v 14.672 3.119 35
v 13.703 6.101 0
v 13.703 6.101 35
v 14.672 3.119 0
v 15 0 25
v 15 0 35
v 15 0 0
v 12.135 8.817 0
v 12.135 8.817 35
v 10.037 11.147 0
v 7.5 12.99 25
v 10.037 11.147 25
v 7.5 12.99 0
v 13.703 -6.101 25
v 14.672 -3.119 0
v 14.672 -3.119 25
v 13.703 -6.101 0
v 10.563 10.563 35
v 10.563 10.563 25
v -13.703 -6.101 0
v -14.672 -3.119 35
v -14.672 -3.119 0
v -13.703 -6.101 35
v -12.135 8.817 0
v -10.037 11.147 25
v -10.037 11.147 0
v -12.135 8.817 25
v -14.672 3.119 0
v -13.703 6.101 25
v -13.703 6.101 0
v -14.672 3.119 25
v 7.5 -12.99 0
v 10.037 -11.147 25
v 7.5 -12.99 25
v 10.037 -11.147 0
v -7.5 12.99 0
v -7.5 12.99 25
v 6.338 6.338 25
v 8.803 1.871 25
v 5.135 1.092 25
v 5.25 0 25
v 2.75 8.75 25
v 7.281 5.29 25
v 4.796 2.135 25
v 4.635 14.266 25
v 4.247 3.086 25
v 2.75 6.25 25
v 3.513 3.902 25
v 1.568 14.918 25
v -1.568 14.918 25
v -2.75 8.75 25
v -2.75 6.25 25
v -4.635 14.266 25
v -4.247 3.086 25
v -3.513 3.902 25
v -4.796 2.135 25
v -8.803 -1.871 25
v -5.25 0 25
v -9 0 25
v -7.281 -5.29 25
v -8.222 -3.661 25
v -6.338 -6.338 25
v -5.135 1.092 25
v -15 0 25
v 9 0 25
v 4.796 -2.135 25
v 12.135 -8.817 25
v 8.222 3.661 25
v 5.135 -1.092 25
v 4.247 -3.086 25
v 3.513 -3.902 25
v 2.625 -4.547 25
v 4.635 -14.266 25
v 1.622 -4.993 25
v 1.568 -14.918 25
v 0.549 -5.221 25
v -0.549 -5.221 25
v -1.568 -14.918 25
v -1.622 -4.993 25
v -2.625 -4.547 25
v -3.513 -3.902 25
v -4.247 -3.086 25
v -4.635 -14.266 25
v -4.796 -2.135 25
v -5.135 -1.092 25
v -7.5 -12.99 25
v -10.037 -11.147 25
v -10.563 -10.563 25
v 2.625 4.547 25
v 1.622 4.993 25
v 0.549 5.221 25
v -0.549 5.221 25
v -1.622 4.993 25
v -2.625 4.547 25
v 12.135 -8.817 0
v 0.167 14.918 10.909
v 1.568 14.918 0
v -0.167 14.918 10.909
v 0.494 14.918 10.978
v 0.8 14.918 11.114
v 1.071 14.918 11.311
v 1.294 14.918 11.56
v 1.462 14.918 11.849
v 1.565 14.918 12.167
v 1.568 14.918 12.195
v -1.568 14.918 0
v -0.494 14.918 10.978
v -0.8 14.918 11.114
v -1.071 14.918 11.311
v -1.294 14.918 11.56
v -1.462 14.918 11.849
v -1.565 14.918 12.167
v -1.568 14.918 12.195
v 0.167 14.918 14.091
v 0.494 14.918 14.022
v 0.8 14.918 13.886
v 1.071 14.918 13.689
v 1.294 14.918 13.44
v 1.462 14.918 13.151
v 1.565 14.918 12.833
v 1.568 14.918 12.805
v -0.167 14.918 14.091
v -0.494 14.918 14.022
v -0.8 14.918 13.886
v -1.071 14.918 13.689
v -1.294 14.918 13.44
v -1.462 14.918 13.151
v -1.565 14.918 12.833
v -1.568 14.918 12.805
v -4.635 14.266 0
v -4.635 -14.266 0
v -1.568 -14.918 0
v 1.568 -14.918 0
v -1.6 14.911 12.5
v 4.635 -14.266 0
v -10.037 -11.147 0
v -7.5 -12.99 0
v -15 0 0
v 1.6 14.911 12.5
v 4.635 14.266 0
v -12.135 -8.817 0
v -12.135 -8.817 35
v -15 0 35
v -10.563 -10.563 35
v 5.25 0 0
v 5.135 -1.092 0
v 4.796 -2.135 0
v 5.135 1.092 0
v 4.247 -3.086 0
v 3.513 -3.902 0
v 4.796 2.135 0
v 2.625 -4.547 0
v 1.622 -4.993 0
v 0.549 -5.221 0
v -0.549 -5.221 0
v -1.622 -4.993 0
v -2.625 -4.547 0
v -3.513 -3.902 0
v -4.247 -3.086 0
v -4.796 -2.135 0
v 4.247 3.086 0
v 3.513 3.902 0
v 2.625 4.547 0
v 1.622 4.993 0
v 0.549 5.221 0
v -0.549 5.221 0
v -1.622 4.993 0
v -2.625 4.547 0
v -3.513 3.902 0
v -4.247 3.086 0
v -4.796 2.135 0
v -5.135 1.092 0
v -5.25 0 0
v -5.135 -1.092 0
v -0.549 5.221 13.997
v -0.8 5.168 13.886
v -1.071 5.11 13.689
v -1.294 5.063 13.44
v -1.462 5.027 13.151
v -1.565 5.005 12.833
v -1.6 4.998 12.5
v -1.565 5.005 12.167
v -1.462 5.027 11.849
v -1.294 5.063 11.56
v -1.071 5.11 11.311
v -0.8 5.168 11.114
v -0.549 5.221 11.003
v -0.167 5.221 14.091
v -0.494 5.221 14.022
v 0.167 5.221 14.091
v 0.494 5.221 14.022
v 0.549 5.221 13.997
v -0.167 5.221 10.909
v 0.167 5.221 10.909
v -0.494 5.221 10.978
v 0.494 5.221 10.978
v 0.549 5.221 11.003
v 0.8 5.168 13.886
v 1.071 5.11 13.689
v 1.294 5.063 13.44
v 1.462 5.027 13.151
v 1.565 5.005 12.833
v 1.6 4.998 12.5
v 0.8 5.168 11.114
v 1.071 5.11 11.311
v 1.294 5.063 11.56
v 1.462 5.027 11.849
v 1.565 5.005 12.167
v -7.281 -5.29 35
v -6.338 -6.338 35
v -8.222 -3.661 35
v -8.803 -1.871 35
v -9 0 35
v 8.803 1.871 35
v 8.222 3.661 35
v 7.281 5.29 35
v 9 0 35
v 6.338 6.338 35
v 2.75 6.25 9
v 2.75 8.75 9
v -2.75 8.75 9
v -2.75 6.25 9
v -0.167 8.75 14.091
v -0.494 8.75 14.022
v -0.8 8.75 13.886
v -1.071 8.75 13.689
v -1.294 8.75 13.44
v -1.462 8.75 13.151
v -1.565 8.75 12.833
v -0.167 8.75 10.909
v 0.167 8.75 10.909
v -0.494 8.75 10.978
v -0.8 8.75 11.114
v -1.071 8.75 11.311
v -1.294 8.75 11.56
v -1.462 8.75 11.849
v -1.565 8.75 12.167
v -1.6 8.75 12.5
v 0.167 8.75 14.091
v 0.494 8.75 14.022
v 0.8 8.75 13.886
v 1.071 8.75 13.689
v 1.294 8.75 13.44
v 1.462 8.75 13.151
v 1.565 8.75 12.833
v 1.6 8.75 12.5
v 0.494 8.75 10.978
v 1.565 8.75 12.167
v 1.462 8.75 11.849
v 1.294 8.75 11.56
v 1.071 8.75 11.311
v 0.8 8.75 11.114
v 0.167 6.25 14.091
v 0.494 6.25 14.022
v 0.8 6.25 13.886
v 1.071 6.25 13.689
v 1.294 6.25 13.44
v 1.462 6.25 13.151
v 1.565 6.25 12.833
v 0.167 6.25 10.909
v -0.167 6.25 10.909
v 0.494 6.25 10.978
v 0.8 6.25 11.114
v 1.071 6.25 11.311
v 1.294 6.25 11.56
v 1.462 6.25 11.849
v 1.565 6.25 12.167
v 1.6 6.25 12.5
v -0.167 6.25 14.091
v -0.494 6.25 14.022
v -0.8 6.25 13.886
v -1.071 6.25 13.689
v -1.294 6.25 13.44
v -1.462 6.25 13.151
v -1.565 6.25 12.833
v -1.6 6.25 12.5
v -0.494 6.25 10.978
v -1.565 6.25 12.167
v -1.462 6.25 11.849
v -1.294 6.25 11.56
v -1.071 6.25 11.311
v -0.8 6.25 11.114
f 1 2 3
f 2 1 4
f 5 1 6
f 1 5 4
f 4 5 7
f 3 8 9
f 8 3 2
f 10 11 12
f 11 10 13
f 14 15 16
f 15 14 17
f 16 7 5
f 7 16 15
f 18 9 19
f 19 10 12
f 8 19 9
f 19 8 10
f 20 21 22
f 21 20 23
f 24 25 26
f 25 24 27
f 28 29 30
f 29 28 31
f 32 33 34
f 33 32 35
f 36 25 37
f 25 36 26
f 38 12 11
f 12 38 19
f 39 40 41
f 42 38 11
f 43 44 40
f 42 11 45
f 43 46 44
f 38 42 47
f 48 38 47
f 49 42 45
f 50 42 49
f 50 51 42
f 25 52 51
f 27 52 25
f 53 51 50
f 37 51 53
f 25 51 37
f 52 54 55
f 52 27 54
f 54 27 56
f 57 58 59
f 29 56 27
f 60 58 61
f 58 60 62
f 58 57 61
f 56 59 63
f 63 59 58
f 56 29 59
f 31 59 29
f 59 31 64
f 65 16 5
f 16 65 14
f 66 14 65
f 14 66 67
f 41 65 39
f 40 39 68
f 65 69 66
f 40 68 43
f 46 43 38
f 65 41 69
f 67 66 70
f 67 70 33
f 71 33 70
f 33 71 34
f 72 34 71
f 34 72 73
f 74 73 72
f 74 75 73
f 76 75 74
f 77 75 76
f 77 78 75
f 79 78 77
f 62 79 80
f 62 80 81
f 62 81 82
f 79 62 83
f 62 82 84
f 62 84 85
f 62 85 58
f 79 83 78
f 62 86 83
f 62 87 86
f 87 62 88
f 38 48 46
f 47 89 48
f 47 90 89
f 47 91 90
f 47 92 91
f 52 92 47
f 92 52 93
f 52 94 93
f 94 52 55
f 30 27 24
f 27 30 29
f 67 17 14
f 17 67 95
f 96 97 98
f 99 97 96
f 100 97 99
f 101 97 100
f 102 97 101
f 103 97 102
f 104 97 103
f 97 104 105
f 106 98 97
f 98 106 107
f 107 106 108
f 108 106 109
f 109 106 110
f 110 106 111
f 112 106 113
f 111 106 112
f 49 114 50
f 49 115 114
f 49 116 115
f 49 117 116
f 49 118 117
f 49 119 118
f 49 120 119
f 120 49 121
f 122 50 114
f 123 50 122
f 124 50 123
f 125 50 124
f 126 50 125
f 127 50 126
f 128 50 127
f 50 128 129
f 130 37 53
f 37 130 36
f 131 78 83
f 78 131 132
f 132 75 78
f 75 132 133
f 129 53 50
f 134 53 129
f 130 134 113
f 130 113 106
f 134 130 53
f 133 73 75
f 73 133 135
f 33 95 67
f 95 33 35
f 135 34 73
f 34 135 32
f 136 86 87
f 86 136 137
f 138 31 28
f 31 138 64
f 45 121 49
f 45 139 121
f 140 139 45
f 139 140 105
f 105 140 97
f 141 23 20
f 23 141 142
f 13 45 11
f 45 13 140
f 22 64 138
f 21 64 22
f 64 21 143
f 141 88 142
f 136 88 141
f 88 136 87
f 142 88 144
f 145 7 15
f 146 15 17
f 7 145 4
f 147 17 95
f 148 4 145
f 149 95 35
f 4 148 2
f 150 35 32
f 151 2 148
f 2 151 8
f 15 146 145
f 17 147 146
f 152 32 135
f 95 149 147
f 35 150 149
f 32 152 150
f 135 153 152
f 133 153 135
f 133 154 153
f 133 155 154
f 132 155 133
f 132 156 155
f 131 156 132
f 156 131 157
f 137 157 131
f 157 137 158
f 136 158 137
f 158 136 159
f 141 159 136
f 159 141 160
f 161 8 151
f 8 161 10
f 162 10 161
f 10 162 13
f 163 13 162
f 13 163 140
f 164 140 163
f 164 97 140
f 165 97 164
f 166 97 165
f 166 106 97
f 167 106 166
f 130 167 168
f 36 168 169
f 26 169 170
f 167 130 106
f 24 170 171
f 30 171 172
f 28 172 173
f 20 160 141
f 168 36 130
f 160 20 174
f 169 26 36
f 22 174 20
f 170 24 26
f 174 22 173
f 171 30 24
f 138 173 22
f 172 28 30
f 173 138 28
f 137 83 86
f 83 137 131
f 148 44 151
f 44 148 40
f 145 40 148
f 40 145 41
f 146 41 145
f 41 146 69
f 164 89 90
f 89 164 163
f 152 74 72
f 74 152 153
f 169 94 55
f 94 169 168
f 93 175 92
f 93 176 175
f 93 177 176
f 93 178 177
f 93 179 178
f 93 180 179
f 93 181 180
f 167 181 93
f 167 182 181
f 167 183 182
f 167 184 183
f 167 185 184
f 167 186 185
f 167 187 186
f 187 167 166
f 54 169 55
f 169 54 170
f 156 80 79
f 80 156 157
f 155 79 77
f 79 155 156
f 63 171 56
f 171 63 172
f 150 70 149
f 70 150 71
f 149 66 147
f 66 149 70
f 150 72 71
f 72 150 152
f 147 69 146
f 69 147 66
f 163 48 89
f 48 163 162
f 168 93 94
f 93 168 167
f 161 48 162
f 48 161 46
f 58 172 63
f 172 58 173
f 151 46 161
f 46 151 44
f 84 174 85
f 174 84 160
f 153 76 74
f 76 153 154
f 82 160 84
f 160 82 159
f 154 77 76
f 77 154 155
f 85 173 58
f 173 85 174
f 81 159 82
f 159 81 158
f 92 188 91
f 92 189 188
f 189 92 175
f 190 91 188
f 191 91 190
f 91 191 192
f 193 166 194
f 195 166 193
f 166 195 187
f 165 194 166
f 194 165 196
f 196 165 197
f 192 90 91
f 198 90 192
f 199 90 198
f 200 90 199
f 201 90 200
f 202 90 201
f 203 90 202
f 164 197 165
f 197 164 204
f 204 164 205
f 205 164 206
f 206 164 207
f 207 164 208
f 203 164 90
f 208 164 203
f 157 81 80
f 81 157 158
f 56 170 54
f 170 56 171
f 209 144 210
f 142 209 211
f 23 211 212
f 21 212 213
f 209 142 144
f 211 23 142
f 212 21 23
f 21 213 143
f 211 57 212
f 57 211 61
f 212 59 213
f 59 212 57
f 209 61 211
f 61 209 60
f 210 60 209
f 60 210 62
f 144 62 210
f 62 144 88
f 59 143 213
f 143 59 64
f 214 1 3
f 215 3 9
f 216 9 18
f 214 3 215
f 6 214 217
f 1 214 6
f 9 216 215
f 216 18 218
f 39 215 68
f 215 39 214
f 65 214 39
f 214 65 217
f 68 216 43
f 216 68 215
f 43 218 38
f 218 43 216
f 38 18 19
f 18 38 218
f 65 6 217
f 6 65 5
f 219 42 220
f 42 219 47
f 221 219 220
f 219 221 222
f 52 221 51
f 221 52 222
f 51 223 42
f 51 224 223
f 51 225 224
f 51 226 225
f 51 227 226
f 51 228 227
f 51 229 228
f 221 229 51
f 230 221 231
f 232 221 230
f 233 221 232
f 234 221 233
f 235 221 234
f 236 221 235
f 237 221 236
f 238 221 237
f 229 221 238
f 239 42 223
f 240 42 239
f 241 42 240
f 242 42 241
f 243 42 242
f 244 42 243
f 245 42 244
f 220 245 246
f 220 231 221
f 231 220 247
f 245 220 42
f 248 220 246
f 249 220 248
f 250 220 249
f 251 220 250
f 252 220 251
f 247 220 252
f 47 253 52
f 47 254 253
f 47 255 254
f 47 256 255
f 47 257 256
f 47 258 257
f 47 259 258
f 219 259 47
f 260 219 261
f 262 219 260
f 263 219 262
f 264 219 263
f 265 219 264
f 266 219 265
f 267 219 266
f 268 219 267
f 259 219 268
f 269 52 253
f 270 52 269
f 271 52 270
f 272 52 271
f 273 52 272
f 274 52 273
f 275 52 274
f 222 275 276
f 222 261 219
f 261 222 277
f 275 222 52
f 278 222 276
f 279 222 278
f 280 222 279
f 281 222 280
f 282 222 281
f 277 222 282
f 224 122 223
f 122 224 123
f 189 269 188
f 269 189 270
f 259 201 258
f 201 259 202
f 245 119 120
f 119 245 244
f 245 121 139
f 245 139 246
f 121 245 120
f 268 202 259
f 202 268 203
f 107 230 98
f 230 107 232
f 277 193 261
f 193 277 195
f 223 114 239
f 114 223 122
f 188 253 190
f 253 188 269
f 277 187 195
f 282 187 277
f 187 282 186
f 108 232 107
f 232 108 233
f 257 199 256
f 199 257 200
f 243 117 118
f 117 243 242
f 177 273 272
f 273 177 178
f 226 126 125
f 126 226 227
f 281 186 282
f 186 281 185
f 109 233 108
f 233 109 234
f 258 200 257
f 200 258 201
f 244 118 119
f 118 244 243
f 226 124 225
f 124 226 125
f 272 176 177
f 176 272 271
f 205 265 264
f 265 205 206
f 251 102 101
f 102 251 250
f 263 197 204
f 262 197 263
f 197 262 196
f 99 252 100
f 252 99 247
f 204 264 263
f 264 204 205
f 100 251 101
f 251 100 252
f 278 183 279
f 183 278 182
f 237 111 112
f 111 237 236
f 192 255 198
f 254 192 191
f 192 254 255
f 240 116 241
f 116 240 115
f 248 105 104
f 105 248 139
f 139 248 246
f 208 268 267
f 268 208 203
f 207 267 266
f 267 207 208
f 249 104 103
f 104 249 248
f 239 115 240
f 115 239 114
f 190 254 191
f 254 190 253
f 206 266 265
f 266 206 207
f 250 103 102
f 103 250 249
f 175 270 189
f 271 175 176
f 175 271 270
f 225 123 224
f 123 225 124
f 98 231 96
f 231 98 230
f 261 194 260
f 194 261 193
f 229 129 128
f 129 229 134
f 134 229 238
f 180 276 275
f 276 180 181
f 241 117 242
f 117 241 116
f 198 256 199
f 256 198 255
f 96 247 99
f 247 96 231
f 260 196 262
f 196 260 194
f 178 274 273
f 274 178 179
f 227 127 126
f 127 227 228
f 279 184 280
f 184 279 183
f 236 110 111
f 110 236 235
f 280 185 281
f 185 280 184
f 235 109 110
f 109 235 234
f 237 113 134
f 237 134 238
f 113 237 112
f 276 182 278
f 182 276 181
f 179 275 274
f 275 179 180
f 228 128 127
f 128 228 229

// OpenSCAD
// Spider Coupling
// Simon Kirkby
// tigger@interthingy.com
// 201005301120

// modes 
// 0 - displays assembled coupling 
// 1 - coupling layed out for printing , single stl
// 2 - just coupling
// 3 - just spider
$fs = 0.01;
            
mode = 2;

// display 

lift = 0.01; // explodes the coupling in mode 0 , 0.0 assembled , 2.0 exploded

// variables

// wheel

wheel_radius = 15; // external radius of entire coupling
wheel_height = 25; // height of the base
shaft_size = 10.5; // shaft size 
shaft_size2 = 10; // shaft size of second wheel. ONLY USED IN MODE 0 AND 1

//coupling

coupling_height =10; // height of the struts 
coupling_thickness = 6; // wall thickness of struts
coupling_struts = 2; // number of struts
spider_angle = 90; // combined angle of the spider arms
 
clearance = 0.2; // linear clearance of the spider
radial_clearance = 3; // radial clearance in degrees at each spider arm

//spider

spider_wall_thickness = 4; // thickness of the spider hub



module spider_leg()
{	
	inc = 360/(2*coupling_struts);
	intersection()
	{
		difference()
		{
			cylinder(coupling_height-clearance,r=wheel_radius-clearance);
			translate([0,0,-(clearance/2)])
			cylinder(coupling_height+2*clearance,r=wheel_radius-coupling_thickness-clearance-spider_wall_thickness);
		}			
		intersection()
		{
			rotate(-90,[0,0,1])
			rotate((spider_angle/coupling_struts)-radial_clearance,[0,0,1])
			cube(size=wheel_radius*5);
			cube(size=wheel_radius*5);			
		}
	}
}

module spider()
{
	inc = 360/(2*coupling_struts);
	color([1,0,0])
	{
	rotate(inc-(spider_angle/coupling_struts),[0,0,1])
	union()
	{
		difference()
		{
			cylinder(coupling_height-clearance,r=wheel_radius-coupling_thickness-clearance);
			translate([0,0,-(clearance/2)])
			cylinder(coupling_height+clearance,r=wheel_radius-coupling_thickness-clearance-spider_wall_thickness);
		}
		for ( z = [1:(coupling_struts*2)])
			{	
				rotate((z*inc)+(radial_clearance/2),[0,0,1])		
				spider_leg();
			}
		}
	}
}

module strut()
{
	inc = 360/(2*coupling_struts);
	intersection()
	{
		difference()
		{
			cylinder(coupling_height,r=wheel_radius);
			translate([0,0,-(0.1+coupling_height/2)])
			cylinder(coupling_height*2+0.1,r=wheel_radius-coupling_thickness);
		}
		intersection()
		{
			rotate(-90,[0,0,1])
			rotate(inc-(spider_angle/coupling_struts),[0,0,1])
			cube(size=wheel_radius*5);
			cube(size=wheel_radius*5);			
		}
	}
}

module struts()
{
	inc = 360/coupling_struts;
	for ( z = [1:coupling_struts])
	{	
		rotate(z*inc,[0,0,1])		
		strut();
	}
}

module shaft(sr)
{
		cylinder(wheel_height*7,r1=sr,r2=sr,center=true);
}

module wheel(r)
{	
	difference()
	{
		union(){
			cylinder(wheel_height,r1=r,r2=r,center=true);
		}
		shaft(sr=shaft_size/2.0);
	}
}

module wheel2(r)
{	
	difference()
	{
		union(){
			cylinder(wheel_height,r1=r,r2=r,center=true);
		}
		shaft(sr=shaft_size2/2.0);
	}
}

module spider_coupling()
{
	translate([0,0,wheel_height/2])
	union()
	{
		wheel(r=wheel_radius);
		translate([0,0,wheel_height/2])
		struts();
	}
}

module spider_coupling2()
{
	translate([0,0,wheel_height/2])
	union()
	{
		wheel2(r=wheel_radius);
		translate([0,0,wheel_height/2])
		struts();
	}
}
module inverted_spider_coupling()
{
	mirror([0,0,1])
	translate([0,0,-(2*wheel_height+(2*lift+1)*coupling_height)])
	rotate((180/coupling_struts),[0,0,1])
	spider_coupling2();
}

module placed_spider()
{
	translate([0,0,wheel_height+lift*coupling_height+(clearance/2)])
	color([1,0,0])
	{
		spider();
	}
}

module display()
{
	spider_coupling();
	placed_spider();
	inverted_spider_coupling();
}

// modal display
if ( mode == 0)
{
	display(); 
}

if (mode == 1)
{
	translate([-wheel_radius,-1.1*wheel_radius,0])
	spider_coupling();
	translate([-wheel_radius,1.1*wheel_radius,0])
	spider_coupling2();
	translate([wheel_radius,0,0])
	spider();
}

if (mode == 2)
{   
	difference(){
        spider_coupling();
        translate ([0,(wheel_radius/2),wheel_height-((3.5/2)+(wheel_height/4))]){
            cube([5.5, 2.5, 3.5+wheel_height/2], center=true);
        }
        translate([0,wheel_radius/2,wheel_height/2]){
            rotate(90,[1,0,0])
            cylinder(h=wheel_radius, d=3.2, center=true);
            }
        }
        
        
    
}

if (mode == 3)
{
	spider();
}
